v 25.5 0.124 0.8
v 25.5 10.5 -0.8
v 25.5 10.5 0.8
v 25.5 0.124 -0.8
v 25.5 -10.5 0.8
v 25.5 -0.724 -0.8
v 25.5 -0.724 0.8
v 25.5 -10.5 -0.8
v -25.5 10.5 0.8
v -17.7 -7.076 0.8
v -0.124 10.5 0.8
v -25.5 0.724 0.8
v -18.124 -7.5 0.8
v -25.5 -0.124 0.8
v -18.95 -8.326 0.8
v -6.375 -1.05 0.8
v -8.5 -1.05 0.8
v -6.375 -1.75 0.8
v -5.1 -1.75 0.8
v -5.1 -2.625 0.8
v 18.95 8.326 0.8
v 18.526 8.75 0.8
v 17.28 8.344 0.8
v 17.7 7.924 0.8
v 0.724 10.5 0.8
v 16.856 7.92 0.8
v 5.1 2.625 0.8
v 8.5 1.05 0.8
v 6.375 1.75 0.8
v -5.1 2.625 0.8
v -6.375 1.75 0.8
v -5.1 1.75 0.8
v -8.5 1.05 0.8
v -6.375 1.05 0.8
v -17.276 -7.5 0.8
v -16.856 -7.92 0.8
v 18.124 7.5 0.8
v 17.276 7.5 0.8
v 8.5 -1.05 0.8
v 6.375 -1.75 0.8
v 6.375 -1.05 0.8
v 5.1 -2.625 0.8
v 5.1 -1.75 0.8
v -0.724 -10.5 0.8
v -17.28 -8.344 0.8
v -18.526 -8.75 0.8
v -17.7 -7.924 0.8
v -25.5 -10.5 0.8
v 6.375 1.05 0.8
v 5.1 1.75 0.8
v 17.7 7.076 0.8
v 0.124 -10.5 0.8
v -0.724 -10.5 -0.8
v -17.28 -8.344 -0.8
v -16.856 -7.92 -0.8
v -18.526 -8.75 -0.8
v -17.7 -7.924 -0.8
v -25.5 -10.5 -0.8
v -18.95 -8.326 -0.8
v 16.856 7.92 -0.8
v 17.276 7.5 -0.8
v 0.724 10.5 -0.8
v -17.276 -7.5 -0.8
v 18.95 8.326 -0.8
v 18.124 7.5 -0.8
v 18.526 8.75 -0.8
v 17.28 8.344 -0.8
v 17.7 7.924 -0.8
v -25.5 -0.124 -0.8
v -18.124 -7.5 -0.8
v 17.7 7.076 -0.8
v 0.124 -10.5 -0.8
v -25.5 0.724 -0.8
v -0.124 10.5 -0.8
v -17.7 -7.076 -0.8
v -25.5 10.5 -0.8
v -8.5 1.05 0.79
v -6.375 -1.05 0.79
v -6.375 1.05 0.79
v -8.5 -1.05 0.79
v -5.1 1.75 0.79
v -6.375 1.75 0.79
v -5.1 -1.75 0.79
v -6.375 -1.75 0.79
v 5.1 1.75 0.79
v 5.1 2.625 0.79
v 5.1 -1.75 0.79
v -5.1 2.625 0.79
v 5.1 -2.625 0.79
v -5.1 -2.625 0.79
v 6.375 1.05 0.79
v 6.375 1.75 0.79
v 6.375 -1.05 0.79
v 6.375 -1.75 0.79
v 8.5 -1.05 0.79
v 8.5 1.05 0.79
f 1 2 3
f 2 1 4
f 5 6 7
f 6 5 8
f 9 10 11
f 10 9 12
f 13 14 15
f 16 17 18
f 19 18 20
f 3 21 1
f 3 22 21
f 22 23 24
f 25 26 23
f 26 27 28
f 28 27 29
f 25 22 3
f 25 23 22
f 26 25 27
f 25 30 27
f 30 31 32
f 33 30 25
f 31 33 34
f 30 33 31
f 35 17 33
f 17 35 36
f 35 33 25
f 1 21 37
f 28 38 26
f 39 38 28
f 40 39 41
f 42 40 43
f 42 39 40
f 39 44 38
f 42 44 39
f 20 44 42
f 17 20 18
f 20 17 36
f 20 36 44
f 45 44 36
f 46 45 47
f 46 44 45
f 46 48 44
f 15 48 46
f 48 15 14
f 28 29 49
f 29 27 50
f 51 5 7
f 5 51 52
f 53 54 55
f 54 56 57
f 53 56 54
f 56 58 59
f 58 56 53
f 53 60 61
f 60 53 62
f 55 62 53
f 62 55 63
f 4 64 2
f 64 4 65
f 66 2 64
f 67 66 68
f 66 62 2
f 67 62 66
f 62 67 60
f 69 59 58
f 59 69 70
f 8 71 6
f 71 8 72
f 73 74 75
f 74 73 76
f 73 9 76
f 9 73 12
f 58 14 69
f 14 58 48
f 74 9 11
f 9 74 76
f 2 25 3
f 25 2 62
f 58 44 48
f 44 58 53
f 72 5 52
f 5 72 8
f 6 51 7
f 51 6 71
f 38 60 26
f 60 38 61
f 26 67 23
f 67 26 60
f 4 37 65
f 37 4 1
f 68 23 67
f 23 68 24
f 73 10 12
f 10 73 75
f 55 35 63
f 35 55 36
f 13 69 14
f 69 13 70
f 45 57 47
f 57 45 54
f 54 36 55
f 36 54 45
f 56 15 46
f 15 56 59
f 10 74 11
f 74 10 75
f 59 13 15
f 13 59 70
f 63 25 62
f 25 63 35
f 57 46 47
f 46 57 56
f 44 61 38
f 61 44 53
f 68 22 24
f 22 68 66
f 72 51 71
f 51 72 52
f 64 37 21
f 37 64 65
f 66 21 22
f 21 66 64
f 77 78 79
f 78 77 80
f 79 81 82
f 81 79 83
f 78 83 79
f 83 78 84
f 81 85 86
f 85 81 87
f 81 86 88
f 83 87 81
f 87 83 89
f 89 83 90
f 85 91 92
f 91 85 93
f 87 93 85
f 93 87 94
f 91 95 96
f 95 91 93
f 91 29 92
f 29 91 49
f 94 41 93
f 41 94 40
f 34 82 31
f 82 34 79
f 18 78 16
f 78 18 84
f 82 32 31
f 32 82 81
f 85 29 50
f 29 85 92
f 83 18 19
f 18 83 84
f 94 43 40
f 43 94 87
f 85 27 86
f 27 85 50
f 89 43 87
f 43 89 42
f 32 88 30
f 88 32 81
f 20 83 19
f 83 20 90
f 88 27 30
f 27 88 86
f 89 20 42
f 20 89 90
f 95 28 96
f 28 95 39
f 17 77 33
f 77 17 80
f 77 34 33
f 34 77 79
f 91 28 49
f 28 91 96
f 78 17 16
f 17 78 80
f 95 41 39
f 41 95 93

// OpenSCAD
// Parameters
pcb_L = 51.0; //[25.5:102.0:0.5]
pcb_W = 21.0; //[10.5:42.0:0.5]
pcb_T = 1.6; //[0.8:3.2:0.1]
corner_R = 2.0; //[0.5:4.0:0.1]
chamfer_C = 0.6; //[0.2:1.2:0.1]
overlap = 1.0; //[0.5:2.0:0.1]
placeholder_eps = 0.01; //[0.001:0.1:0.001]

// Base PCB with rounded corners
module pcb_base() {
  difference() {
    union() {
      translate([0, 0, 0])
        cube([pcb_L, pcb_W, pcb_T], center=true);
      translate([-pcb_L/2 + corner_R, pcb_W/2 - corner_R, 0])
        cylinder(r=corner_R, h=pcb_T, center=true);
      translate([pcb_L/2 - corner_R, pcb_W/2 - corner_R, 0])
        cylinder(r=corner_R, h=pcb_T, center=true);
      translate([-pcb_L/2 + corner_R, -pcb_W/2 + corner_R, 0])
        cylinder(r=corner_R, h=pcb_T, center=true);
      translate([pcb_L/2 - corner_R, -pcb_W/2 + corner_R, 0])
        cylinder(r=corner_R, h=pcb_T, center=true);
    }
    // Chamfered edges
    translate([pcb_L/2 - chamfer_C/2, 0, 0])
      rotate([0, 0, 45])
      cube([chamfer_C, pcb_W + 2*overlap, pcb_T + 2*overlap], center=true);
    translate([-pcb_L/2 + chamfer_C/2, 0, 0])
      rotate([0, 0, 45])
      cube([chamfer_C, pcb_W + 2*overlap, pcb_T + 2*overlap], center=true);
    translate([0, pcb_W/2 - chamfer_C/2, 0])
      rotate([0, 0, 45])
      cube([pcb_L + 2*overlap, chamfer_C, pcb_T + 2*overlap], center=true);
    translate([0, -pcb_W/2 + chamfer_C/2, 0])
      rotate([0, 0, 45])
      cube([pcb_L + 2*overlap, chamfer_C, pcb_T + 2*overlap], center=true);
  }
}

// Placeholders for zero-impact cuts
module placeholders() {
  translate([0, 0, pcb_T/2 - placeholder_eps/2])
    cylinder(r=corner_R/2, h=placeholder_eps, center=true);
  translate([0, 0, pcb_T/2 - placeholder_eps/2])
    cube([pcb_L/4, pcb_W/6, placeholder_eps], center=true);
  translate([0, 0, pcb_T/2 - placeholder_eps/2])
    cube([pcb_L/5, pcb_W/4, placeholder_eps], center=true);
  translate([0, 0, pcb_T/2 - placeholder_eps/2])
    cube([pcb_L/3, pcb_W/10, placeholder_eps], center=true);
}

// Final PCB with all features
module final_pcb() {
  difference() {
    pcb_base();
    placeholders();
  }
}

// Render the final PCB
color([0.0, 0.4, 0.2]) // PCB green color
final_pcb();
